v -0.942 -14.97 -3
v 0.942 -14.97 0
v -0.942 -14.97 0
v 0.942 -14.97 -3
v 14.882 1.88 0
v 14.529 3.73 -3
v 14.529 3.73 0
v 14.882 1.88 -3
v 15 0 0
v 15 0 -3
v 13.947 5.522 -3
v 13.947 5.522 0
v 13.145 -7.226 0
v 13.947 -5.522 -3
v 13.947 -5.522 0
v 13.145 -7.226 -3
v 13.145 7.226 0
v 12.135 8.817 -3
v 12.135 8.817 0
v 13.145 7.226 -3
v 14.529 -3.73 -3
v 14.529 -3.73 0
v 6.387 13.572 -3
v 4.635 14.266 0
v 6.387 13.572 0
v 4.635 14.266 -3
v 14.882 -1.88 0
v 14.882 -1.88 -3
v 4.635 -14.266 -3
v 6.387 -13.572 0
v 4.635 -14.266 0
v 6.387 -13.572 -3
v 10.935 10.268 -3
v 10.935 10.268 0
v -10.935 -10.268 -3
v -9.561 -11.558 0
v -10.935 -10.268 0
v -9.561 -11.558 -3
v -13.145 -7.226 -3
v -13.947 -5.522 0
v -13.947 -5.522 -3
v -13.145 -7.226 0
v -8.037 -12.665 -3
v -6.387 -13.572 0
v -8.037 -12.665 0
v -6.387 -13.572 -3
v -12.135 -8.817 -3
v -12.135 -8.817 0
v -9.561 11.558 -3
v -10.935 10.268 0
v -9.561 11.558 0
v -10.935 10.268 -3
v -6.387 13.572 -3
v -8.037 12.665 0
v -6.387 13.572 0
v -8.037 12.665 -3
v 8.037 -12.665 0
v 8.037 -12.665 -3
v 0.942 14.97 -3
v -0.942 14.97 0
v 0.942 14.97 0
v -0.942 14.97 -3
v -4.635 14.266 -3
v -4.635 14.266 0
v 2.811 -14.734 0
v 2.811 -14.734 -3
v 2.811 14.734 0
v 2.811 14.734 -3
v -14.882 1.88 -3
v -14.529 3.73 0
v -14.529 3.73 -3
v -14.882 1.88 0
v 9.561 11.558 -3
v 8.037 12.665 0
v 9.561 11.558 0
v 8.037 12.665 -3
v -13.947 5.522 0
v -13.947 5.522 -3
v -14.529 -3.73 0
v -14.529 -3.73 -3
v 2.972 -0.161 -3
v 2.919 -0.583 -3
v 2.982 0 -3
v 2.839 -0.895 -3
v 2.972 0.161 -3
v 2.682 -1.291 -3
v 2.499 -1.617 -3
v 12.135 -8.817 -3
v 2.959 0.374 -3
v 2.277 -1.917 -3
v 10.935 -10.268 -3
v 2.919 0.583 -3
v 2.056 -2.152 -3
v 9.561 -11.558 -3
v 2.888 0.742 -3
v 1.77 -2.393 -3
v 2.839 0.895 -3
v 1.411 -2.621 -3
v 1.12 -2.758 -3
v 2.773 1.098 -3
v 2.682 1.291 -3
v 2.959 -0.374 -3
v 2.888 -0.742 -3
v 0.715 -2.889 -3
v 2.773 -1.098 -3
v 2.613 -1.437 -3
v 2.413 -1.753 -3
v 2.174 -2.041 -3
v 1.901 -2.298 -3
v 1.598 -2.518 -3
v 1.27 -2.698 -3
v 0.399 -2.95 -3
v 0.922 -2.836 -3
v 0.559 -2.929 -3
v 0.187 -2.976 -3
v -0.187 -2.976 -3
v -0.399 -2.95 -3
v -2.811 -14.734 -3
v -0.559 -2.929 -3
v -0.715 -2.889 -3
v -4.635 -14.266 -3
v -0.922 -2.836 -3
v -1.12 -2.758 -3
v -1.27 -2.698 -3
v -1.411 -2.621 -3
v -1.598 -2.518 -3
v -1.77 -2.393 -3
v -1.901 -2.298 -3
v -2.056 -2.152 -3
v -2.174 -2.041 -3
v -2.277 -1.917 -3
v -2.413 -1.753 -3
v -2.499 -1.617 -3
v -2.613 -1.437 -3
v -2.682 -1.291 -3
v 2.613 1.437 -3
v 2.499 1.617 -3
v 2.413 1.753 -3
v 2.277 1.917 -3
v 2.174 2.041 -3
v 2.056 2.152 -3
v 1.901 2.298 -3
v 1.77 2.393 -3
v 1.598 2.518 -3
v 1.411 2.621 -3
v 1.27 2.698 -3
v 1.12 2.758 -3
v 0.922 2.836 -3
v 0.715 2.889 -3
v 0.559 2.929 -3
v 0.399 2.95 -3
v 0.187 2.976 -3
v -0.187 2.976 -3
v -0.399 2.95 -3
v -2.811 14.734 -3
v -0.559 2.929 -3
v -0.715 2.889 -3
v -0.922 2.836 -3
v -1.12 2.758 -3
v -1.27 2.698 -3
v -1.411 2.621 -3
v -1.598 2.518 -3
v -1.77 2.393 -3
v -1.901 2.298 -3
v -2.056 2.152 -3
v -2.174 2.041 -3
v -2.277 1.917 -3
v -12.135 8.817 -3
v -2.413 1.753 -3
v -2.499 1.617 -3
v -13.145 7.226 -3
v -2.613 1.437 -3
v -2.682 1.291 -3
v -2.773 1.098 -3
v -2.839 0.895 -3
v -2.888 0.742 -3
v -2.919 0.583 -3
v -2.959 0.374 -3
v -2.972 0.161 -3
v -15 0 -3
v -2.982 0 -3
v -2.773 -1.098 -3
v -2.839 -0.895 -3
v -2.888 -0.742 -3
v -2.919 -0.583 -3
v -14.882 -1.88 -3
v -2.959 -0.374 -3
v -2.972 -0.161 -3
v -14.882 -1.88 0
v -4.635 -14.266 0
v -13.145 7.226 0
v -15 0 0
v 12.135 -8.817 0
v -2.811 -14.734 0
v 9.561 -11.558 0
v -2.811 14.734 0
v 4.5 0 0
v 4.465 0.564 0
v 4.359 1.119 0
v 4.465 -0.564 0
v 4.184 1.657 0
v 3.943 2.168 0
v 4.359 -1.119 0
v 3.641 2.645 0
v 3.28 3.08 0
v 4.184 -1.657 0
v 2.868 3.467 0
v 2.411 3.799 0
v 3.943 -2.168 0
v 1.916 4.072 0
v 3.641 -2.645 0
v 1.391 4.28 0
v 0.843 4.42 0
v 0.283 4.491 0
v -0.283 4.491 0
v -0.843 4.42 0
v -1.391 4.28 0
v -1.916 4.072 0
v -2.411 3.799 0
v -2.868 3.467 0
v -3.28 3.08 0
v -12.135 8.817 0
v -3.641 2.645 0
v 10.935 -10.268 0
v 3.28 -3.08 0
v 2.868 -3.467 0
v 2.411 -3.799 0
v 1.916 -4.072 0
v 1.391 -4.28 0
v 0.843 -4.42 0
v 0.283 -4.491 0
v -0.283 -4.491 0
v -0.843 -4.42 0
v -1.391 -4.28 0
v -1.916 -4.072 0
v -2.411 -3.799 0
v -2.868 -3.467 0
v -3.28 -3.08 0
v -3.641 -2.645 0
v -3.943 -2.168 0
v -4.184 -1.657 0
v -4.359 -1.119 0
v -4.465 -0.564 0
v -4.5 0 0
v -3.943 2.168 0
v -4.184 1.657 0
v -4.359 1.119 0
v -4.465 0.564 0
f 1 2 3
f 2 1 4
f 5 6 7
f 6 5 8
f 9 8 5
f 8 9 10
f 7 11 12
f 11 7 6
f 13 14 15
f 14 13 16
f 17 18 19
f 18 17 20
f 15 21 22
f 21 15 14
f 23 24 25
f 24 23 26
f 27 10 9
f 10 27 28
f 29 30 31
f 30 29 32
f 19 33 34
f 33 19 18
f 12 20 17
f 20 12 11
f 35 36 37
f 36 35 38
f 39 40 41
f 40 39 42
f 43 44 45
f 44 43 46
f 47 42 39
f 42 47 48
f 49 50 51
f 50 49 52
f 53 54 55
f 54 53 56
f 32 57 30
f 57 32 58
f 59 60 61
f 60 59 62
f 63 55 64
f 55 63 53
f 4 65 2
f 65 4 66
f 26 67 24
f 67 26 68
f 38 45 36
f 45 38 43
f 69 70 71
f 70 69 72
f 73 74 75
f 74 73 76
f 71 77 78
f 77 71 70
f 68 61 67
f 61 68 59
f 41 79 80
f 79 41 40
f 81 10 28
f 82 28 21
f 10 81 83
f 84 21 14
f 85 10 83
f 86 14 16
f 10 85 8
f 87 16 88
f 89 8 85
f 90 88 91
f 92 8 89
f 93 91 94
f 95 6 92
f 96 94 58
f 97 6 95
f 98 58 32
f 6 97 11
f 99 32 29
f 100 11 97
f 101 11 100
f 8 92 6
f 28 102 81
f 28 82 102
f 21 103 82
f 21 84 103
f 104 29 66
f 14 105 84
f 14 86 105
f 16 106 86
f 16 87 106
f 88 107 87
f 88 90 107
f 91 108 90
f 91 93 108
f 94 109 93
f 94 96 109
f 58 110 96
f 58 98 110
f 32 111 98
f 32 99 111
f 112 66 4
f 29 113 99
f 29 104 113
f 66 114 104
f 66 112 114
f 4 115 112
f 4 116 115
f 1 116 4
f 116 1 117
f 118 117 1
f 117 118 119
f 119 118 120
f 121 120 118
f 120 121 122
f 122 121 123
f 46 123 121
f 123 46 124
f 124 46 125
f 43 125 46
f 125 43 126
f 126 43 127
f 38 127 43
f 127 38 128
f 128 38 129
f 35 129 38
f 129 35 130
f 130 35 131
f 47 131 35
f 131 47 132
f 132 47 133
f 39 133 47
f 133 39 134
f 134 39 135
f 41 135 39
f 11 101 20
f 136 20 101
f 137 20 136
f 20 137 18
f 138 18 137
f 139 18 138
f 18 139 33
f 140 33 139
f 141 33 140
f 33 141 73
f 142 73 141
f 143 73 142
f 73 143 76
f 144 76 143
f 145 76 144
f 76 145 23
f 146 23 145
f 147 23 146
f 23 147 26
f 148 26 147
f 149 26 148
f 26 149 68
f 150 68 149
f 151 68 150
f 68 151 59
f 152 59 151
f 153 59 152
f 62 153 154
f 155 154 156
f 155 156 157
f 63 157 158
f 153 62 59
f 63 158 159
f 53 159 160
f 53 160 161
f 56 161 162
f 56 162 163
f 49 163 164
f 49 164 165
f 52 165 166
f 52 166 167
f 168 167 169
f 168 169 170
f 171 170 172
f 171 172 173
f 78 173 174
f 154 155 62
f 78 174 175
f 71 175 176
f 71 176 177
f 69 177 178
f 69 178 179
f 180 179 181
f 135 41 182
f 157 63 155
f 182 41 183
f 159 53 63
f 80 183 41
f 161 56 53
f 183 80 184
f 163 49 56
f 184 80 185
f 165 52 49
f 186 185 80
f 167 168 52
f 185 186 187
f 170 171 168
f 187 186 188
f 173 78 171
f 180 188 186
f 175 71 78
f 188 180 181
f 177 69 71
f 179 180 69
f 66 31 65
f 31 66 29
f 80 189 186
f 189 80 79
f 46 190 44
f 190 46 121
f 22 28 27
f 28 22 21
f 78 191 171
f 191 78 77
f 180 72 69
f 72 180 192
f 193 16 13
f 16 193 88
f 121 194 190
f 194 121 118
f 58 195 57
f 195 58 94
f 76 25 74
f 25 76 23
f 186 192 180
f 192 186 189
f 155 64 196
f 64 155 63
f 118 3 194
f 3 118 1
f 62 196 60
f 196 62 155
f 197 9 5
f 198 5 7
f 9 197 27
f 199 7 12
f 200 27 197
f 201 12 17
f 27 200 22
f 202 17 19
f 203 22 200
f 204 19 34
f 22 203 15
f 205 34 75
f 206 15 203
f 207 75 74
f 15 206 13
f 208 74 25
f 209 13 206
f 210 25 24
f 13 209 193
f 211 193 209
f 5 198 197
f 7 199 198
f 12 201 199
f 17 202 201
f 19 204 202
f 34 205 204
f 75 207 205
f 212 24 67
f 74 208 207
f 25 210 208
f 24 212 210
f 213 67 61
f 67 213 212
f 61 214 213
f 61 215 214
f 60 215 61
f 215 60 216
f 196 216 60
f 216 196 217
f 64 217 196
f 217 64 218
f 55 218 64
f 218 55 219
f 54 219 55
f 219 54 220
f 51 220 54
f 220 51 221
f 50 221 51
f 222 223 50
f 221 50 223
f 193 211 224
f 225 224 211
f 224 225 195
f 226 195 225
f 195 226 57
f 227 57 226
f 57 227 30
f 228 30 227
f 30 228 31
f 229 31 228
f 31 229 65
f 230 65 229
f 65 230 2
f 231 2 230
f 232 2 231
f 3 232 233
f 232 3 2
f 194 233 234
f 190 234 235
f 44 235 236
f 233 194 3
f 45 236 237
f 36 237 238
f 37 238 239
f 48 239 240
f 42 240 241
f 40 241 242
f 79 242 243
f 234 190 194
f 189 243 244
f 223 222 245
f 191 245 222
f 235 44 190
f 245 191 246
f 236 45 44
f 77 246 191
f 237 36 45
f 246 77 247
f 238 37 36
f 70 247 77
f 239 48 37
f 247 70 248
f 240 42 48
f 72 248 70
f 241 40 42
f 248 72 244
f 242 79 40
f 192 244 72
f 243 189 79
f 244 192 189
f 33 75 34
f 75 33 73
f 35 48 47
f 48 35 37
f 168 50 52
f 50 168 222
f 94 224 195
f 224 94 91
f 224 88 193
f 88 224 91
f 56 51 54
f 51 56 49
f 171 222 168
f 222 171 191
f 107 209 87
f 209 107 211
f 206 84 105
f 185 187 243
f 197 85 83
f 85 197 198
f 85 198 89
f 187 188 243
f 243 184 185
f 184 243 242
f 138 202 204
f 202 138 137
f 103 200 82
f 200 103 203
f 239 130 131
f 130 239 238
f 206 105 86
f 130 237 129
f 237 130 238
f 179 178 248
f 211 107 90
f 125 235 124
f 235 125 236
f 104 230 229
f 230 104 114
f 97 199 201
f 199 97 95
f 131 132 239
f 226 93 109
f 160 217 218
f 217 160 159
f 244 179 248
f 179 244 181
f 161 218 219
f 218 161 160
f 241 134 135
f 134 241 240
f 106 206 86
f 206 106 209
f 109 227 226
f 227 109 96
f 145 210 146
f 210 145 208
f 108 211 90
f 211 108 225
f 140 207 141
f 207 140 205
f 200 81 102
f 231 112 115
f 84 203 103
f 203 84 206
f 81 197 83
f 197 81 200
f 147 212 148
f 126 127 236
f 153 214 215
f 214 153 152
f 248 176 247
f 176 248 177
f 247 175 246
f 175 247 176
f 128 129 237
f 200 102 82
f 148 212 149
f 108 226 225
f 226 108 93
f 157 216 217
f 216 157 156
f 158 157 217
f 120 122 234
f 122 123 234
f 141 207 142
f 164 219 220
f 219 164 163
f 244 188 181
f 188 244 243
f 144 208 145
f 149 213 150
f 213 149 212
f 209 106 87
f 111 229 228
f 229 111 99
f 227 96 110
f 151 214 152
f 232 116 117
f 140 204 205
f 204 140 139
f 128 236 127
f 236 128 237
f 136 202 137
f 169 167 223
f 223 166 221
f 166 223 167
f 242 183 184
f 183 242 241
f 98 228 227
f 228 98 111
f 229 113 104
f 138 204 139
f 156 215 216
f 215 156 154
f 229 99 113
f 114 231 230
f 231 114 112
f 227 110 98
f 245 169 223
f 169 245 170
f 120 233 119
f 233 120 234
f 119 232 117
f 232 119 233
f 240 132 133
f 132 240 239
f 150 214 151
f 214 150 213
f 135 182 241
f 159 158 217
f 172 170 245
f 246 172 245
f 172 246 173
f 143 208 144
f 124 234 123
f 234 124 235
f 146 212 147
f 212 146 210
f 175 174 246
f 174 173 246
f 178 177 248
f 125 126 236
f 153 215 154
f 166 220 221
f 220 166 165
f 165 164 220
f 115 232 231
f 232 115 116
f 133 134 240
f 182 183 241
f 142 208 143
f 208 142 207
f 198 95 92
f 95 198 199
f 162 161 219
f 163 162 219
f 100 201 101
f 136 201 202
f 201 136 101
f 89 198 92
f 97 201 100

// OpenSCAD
$fn = 50;


difference() {
	union() {
		translate(v = [0, 0, -3.0000000000]) {
			cylinder(h = 3, r = 15.0000000000);
		}
		translate(v = [0, 0, -3.0000000000]) {
			cylinder(h = 3, r = 2.8750000000);
		}
	}
	union() {
		translate(v = [0, 0, 0]) {
			rotate(a = [0, 0, 0]) {
				difference() {
					union() {
						translate(v = [0, 0, -3.0000000000]) {
							cylinder(h = 3, r = 2.2500000000);
						}
						translate(v = [0, 0, -4.2000000000]) {
							cylinder(h = 4.2000000000, r1 = 2.3750000000, r2 = 4.5000000000);
						}
						translate(v = [0, 0, -3.0000000000]) {
							cylinder(h = 3, r = 2.3750000000);
						}
						translate(v = [0, 0, -3.0000000000]) {
							cylinder(h = 3, r = 2.2500000000);
						}
					}
					union();
				}
			}
		}
	}
}
